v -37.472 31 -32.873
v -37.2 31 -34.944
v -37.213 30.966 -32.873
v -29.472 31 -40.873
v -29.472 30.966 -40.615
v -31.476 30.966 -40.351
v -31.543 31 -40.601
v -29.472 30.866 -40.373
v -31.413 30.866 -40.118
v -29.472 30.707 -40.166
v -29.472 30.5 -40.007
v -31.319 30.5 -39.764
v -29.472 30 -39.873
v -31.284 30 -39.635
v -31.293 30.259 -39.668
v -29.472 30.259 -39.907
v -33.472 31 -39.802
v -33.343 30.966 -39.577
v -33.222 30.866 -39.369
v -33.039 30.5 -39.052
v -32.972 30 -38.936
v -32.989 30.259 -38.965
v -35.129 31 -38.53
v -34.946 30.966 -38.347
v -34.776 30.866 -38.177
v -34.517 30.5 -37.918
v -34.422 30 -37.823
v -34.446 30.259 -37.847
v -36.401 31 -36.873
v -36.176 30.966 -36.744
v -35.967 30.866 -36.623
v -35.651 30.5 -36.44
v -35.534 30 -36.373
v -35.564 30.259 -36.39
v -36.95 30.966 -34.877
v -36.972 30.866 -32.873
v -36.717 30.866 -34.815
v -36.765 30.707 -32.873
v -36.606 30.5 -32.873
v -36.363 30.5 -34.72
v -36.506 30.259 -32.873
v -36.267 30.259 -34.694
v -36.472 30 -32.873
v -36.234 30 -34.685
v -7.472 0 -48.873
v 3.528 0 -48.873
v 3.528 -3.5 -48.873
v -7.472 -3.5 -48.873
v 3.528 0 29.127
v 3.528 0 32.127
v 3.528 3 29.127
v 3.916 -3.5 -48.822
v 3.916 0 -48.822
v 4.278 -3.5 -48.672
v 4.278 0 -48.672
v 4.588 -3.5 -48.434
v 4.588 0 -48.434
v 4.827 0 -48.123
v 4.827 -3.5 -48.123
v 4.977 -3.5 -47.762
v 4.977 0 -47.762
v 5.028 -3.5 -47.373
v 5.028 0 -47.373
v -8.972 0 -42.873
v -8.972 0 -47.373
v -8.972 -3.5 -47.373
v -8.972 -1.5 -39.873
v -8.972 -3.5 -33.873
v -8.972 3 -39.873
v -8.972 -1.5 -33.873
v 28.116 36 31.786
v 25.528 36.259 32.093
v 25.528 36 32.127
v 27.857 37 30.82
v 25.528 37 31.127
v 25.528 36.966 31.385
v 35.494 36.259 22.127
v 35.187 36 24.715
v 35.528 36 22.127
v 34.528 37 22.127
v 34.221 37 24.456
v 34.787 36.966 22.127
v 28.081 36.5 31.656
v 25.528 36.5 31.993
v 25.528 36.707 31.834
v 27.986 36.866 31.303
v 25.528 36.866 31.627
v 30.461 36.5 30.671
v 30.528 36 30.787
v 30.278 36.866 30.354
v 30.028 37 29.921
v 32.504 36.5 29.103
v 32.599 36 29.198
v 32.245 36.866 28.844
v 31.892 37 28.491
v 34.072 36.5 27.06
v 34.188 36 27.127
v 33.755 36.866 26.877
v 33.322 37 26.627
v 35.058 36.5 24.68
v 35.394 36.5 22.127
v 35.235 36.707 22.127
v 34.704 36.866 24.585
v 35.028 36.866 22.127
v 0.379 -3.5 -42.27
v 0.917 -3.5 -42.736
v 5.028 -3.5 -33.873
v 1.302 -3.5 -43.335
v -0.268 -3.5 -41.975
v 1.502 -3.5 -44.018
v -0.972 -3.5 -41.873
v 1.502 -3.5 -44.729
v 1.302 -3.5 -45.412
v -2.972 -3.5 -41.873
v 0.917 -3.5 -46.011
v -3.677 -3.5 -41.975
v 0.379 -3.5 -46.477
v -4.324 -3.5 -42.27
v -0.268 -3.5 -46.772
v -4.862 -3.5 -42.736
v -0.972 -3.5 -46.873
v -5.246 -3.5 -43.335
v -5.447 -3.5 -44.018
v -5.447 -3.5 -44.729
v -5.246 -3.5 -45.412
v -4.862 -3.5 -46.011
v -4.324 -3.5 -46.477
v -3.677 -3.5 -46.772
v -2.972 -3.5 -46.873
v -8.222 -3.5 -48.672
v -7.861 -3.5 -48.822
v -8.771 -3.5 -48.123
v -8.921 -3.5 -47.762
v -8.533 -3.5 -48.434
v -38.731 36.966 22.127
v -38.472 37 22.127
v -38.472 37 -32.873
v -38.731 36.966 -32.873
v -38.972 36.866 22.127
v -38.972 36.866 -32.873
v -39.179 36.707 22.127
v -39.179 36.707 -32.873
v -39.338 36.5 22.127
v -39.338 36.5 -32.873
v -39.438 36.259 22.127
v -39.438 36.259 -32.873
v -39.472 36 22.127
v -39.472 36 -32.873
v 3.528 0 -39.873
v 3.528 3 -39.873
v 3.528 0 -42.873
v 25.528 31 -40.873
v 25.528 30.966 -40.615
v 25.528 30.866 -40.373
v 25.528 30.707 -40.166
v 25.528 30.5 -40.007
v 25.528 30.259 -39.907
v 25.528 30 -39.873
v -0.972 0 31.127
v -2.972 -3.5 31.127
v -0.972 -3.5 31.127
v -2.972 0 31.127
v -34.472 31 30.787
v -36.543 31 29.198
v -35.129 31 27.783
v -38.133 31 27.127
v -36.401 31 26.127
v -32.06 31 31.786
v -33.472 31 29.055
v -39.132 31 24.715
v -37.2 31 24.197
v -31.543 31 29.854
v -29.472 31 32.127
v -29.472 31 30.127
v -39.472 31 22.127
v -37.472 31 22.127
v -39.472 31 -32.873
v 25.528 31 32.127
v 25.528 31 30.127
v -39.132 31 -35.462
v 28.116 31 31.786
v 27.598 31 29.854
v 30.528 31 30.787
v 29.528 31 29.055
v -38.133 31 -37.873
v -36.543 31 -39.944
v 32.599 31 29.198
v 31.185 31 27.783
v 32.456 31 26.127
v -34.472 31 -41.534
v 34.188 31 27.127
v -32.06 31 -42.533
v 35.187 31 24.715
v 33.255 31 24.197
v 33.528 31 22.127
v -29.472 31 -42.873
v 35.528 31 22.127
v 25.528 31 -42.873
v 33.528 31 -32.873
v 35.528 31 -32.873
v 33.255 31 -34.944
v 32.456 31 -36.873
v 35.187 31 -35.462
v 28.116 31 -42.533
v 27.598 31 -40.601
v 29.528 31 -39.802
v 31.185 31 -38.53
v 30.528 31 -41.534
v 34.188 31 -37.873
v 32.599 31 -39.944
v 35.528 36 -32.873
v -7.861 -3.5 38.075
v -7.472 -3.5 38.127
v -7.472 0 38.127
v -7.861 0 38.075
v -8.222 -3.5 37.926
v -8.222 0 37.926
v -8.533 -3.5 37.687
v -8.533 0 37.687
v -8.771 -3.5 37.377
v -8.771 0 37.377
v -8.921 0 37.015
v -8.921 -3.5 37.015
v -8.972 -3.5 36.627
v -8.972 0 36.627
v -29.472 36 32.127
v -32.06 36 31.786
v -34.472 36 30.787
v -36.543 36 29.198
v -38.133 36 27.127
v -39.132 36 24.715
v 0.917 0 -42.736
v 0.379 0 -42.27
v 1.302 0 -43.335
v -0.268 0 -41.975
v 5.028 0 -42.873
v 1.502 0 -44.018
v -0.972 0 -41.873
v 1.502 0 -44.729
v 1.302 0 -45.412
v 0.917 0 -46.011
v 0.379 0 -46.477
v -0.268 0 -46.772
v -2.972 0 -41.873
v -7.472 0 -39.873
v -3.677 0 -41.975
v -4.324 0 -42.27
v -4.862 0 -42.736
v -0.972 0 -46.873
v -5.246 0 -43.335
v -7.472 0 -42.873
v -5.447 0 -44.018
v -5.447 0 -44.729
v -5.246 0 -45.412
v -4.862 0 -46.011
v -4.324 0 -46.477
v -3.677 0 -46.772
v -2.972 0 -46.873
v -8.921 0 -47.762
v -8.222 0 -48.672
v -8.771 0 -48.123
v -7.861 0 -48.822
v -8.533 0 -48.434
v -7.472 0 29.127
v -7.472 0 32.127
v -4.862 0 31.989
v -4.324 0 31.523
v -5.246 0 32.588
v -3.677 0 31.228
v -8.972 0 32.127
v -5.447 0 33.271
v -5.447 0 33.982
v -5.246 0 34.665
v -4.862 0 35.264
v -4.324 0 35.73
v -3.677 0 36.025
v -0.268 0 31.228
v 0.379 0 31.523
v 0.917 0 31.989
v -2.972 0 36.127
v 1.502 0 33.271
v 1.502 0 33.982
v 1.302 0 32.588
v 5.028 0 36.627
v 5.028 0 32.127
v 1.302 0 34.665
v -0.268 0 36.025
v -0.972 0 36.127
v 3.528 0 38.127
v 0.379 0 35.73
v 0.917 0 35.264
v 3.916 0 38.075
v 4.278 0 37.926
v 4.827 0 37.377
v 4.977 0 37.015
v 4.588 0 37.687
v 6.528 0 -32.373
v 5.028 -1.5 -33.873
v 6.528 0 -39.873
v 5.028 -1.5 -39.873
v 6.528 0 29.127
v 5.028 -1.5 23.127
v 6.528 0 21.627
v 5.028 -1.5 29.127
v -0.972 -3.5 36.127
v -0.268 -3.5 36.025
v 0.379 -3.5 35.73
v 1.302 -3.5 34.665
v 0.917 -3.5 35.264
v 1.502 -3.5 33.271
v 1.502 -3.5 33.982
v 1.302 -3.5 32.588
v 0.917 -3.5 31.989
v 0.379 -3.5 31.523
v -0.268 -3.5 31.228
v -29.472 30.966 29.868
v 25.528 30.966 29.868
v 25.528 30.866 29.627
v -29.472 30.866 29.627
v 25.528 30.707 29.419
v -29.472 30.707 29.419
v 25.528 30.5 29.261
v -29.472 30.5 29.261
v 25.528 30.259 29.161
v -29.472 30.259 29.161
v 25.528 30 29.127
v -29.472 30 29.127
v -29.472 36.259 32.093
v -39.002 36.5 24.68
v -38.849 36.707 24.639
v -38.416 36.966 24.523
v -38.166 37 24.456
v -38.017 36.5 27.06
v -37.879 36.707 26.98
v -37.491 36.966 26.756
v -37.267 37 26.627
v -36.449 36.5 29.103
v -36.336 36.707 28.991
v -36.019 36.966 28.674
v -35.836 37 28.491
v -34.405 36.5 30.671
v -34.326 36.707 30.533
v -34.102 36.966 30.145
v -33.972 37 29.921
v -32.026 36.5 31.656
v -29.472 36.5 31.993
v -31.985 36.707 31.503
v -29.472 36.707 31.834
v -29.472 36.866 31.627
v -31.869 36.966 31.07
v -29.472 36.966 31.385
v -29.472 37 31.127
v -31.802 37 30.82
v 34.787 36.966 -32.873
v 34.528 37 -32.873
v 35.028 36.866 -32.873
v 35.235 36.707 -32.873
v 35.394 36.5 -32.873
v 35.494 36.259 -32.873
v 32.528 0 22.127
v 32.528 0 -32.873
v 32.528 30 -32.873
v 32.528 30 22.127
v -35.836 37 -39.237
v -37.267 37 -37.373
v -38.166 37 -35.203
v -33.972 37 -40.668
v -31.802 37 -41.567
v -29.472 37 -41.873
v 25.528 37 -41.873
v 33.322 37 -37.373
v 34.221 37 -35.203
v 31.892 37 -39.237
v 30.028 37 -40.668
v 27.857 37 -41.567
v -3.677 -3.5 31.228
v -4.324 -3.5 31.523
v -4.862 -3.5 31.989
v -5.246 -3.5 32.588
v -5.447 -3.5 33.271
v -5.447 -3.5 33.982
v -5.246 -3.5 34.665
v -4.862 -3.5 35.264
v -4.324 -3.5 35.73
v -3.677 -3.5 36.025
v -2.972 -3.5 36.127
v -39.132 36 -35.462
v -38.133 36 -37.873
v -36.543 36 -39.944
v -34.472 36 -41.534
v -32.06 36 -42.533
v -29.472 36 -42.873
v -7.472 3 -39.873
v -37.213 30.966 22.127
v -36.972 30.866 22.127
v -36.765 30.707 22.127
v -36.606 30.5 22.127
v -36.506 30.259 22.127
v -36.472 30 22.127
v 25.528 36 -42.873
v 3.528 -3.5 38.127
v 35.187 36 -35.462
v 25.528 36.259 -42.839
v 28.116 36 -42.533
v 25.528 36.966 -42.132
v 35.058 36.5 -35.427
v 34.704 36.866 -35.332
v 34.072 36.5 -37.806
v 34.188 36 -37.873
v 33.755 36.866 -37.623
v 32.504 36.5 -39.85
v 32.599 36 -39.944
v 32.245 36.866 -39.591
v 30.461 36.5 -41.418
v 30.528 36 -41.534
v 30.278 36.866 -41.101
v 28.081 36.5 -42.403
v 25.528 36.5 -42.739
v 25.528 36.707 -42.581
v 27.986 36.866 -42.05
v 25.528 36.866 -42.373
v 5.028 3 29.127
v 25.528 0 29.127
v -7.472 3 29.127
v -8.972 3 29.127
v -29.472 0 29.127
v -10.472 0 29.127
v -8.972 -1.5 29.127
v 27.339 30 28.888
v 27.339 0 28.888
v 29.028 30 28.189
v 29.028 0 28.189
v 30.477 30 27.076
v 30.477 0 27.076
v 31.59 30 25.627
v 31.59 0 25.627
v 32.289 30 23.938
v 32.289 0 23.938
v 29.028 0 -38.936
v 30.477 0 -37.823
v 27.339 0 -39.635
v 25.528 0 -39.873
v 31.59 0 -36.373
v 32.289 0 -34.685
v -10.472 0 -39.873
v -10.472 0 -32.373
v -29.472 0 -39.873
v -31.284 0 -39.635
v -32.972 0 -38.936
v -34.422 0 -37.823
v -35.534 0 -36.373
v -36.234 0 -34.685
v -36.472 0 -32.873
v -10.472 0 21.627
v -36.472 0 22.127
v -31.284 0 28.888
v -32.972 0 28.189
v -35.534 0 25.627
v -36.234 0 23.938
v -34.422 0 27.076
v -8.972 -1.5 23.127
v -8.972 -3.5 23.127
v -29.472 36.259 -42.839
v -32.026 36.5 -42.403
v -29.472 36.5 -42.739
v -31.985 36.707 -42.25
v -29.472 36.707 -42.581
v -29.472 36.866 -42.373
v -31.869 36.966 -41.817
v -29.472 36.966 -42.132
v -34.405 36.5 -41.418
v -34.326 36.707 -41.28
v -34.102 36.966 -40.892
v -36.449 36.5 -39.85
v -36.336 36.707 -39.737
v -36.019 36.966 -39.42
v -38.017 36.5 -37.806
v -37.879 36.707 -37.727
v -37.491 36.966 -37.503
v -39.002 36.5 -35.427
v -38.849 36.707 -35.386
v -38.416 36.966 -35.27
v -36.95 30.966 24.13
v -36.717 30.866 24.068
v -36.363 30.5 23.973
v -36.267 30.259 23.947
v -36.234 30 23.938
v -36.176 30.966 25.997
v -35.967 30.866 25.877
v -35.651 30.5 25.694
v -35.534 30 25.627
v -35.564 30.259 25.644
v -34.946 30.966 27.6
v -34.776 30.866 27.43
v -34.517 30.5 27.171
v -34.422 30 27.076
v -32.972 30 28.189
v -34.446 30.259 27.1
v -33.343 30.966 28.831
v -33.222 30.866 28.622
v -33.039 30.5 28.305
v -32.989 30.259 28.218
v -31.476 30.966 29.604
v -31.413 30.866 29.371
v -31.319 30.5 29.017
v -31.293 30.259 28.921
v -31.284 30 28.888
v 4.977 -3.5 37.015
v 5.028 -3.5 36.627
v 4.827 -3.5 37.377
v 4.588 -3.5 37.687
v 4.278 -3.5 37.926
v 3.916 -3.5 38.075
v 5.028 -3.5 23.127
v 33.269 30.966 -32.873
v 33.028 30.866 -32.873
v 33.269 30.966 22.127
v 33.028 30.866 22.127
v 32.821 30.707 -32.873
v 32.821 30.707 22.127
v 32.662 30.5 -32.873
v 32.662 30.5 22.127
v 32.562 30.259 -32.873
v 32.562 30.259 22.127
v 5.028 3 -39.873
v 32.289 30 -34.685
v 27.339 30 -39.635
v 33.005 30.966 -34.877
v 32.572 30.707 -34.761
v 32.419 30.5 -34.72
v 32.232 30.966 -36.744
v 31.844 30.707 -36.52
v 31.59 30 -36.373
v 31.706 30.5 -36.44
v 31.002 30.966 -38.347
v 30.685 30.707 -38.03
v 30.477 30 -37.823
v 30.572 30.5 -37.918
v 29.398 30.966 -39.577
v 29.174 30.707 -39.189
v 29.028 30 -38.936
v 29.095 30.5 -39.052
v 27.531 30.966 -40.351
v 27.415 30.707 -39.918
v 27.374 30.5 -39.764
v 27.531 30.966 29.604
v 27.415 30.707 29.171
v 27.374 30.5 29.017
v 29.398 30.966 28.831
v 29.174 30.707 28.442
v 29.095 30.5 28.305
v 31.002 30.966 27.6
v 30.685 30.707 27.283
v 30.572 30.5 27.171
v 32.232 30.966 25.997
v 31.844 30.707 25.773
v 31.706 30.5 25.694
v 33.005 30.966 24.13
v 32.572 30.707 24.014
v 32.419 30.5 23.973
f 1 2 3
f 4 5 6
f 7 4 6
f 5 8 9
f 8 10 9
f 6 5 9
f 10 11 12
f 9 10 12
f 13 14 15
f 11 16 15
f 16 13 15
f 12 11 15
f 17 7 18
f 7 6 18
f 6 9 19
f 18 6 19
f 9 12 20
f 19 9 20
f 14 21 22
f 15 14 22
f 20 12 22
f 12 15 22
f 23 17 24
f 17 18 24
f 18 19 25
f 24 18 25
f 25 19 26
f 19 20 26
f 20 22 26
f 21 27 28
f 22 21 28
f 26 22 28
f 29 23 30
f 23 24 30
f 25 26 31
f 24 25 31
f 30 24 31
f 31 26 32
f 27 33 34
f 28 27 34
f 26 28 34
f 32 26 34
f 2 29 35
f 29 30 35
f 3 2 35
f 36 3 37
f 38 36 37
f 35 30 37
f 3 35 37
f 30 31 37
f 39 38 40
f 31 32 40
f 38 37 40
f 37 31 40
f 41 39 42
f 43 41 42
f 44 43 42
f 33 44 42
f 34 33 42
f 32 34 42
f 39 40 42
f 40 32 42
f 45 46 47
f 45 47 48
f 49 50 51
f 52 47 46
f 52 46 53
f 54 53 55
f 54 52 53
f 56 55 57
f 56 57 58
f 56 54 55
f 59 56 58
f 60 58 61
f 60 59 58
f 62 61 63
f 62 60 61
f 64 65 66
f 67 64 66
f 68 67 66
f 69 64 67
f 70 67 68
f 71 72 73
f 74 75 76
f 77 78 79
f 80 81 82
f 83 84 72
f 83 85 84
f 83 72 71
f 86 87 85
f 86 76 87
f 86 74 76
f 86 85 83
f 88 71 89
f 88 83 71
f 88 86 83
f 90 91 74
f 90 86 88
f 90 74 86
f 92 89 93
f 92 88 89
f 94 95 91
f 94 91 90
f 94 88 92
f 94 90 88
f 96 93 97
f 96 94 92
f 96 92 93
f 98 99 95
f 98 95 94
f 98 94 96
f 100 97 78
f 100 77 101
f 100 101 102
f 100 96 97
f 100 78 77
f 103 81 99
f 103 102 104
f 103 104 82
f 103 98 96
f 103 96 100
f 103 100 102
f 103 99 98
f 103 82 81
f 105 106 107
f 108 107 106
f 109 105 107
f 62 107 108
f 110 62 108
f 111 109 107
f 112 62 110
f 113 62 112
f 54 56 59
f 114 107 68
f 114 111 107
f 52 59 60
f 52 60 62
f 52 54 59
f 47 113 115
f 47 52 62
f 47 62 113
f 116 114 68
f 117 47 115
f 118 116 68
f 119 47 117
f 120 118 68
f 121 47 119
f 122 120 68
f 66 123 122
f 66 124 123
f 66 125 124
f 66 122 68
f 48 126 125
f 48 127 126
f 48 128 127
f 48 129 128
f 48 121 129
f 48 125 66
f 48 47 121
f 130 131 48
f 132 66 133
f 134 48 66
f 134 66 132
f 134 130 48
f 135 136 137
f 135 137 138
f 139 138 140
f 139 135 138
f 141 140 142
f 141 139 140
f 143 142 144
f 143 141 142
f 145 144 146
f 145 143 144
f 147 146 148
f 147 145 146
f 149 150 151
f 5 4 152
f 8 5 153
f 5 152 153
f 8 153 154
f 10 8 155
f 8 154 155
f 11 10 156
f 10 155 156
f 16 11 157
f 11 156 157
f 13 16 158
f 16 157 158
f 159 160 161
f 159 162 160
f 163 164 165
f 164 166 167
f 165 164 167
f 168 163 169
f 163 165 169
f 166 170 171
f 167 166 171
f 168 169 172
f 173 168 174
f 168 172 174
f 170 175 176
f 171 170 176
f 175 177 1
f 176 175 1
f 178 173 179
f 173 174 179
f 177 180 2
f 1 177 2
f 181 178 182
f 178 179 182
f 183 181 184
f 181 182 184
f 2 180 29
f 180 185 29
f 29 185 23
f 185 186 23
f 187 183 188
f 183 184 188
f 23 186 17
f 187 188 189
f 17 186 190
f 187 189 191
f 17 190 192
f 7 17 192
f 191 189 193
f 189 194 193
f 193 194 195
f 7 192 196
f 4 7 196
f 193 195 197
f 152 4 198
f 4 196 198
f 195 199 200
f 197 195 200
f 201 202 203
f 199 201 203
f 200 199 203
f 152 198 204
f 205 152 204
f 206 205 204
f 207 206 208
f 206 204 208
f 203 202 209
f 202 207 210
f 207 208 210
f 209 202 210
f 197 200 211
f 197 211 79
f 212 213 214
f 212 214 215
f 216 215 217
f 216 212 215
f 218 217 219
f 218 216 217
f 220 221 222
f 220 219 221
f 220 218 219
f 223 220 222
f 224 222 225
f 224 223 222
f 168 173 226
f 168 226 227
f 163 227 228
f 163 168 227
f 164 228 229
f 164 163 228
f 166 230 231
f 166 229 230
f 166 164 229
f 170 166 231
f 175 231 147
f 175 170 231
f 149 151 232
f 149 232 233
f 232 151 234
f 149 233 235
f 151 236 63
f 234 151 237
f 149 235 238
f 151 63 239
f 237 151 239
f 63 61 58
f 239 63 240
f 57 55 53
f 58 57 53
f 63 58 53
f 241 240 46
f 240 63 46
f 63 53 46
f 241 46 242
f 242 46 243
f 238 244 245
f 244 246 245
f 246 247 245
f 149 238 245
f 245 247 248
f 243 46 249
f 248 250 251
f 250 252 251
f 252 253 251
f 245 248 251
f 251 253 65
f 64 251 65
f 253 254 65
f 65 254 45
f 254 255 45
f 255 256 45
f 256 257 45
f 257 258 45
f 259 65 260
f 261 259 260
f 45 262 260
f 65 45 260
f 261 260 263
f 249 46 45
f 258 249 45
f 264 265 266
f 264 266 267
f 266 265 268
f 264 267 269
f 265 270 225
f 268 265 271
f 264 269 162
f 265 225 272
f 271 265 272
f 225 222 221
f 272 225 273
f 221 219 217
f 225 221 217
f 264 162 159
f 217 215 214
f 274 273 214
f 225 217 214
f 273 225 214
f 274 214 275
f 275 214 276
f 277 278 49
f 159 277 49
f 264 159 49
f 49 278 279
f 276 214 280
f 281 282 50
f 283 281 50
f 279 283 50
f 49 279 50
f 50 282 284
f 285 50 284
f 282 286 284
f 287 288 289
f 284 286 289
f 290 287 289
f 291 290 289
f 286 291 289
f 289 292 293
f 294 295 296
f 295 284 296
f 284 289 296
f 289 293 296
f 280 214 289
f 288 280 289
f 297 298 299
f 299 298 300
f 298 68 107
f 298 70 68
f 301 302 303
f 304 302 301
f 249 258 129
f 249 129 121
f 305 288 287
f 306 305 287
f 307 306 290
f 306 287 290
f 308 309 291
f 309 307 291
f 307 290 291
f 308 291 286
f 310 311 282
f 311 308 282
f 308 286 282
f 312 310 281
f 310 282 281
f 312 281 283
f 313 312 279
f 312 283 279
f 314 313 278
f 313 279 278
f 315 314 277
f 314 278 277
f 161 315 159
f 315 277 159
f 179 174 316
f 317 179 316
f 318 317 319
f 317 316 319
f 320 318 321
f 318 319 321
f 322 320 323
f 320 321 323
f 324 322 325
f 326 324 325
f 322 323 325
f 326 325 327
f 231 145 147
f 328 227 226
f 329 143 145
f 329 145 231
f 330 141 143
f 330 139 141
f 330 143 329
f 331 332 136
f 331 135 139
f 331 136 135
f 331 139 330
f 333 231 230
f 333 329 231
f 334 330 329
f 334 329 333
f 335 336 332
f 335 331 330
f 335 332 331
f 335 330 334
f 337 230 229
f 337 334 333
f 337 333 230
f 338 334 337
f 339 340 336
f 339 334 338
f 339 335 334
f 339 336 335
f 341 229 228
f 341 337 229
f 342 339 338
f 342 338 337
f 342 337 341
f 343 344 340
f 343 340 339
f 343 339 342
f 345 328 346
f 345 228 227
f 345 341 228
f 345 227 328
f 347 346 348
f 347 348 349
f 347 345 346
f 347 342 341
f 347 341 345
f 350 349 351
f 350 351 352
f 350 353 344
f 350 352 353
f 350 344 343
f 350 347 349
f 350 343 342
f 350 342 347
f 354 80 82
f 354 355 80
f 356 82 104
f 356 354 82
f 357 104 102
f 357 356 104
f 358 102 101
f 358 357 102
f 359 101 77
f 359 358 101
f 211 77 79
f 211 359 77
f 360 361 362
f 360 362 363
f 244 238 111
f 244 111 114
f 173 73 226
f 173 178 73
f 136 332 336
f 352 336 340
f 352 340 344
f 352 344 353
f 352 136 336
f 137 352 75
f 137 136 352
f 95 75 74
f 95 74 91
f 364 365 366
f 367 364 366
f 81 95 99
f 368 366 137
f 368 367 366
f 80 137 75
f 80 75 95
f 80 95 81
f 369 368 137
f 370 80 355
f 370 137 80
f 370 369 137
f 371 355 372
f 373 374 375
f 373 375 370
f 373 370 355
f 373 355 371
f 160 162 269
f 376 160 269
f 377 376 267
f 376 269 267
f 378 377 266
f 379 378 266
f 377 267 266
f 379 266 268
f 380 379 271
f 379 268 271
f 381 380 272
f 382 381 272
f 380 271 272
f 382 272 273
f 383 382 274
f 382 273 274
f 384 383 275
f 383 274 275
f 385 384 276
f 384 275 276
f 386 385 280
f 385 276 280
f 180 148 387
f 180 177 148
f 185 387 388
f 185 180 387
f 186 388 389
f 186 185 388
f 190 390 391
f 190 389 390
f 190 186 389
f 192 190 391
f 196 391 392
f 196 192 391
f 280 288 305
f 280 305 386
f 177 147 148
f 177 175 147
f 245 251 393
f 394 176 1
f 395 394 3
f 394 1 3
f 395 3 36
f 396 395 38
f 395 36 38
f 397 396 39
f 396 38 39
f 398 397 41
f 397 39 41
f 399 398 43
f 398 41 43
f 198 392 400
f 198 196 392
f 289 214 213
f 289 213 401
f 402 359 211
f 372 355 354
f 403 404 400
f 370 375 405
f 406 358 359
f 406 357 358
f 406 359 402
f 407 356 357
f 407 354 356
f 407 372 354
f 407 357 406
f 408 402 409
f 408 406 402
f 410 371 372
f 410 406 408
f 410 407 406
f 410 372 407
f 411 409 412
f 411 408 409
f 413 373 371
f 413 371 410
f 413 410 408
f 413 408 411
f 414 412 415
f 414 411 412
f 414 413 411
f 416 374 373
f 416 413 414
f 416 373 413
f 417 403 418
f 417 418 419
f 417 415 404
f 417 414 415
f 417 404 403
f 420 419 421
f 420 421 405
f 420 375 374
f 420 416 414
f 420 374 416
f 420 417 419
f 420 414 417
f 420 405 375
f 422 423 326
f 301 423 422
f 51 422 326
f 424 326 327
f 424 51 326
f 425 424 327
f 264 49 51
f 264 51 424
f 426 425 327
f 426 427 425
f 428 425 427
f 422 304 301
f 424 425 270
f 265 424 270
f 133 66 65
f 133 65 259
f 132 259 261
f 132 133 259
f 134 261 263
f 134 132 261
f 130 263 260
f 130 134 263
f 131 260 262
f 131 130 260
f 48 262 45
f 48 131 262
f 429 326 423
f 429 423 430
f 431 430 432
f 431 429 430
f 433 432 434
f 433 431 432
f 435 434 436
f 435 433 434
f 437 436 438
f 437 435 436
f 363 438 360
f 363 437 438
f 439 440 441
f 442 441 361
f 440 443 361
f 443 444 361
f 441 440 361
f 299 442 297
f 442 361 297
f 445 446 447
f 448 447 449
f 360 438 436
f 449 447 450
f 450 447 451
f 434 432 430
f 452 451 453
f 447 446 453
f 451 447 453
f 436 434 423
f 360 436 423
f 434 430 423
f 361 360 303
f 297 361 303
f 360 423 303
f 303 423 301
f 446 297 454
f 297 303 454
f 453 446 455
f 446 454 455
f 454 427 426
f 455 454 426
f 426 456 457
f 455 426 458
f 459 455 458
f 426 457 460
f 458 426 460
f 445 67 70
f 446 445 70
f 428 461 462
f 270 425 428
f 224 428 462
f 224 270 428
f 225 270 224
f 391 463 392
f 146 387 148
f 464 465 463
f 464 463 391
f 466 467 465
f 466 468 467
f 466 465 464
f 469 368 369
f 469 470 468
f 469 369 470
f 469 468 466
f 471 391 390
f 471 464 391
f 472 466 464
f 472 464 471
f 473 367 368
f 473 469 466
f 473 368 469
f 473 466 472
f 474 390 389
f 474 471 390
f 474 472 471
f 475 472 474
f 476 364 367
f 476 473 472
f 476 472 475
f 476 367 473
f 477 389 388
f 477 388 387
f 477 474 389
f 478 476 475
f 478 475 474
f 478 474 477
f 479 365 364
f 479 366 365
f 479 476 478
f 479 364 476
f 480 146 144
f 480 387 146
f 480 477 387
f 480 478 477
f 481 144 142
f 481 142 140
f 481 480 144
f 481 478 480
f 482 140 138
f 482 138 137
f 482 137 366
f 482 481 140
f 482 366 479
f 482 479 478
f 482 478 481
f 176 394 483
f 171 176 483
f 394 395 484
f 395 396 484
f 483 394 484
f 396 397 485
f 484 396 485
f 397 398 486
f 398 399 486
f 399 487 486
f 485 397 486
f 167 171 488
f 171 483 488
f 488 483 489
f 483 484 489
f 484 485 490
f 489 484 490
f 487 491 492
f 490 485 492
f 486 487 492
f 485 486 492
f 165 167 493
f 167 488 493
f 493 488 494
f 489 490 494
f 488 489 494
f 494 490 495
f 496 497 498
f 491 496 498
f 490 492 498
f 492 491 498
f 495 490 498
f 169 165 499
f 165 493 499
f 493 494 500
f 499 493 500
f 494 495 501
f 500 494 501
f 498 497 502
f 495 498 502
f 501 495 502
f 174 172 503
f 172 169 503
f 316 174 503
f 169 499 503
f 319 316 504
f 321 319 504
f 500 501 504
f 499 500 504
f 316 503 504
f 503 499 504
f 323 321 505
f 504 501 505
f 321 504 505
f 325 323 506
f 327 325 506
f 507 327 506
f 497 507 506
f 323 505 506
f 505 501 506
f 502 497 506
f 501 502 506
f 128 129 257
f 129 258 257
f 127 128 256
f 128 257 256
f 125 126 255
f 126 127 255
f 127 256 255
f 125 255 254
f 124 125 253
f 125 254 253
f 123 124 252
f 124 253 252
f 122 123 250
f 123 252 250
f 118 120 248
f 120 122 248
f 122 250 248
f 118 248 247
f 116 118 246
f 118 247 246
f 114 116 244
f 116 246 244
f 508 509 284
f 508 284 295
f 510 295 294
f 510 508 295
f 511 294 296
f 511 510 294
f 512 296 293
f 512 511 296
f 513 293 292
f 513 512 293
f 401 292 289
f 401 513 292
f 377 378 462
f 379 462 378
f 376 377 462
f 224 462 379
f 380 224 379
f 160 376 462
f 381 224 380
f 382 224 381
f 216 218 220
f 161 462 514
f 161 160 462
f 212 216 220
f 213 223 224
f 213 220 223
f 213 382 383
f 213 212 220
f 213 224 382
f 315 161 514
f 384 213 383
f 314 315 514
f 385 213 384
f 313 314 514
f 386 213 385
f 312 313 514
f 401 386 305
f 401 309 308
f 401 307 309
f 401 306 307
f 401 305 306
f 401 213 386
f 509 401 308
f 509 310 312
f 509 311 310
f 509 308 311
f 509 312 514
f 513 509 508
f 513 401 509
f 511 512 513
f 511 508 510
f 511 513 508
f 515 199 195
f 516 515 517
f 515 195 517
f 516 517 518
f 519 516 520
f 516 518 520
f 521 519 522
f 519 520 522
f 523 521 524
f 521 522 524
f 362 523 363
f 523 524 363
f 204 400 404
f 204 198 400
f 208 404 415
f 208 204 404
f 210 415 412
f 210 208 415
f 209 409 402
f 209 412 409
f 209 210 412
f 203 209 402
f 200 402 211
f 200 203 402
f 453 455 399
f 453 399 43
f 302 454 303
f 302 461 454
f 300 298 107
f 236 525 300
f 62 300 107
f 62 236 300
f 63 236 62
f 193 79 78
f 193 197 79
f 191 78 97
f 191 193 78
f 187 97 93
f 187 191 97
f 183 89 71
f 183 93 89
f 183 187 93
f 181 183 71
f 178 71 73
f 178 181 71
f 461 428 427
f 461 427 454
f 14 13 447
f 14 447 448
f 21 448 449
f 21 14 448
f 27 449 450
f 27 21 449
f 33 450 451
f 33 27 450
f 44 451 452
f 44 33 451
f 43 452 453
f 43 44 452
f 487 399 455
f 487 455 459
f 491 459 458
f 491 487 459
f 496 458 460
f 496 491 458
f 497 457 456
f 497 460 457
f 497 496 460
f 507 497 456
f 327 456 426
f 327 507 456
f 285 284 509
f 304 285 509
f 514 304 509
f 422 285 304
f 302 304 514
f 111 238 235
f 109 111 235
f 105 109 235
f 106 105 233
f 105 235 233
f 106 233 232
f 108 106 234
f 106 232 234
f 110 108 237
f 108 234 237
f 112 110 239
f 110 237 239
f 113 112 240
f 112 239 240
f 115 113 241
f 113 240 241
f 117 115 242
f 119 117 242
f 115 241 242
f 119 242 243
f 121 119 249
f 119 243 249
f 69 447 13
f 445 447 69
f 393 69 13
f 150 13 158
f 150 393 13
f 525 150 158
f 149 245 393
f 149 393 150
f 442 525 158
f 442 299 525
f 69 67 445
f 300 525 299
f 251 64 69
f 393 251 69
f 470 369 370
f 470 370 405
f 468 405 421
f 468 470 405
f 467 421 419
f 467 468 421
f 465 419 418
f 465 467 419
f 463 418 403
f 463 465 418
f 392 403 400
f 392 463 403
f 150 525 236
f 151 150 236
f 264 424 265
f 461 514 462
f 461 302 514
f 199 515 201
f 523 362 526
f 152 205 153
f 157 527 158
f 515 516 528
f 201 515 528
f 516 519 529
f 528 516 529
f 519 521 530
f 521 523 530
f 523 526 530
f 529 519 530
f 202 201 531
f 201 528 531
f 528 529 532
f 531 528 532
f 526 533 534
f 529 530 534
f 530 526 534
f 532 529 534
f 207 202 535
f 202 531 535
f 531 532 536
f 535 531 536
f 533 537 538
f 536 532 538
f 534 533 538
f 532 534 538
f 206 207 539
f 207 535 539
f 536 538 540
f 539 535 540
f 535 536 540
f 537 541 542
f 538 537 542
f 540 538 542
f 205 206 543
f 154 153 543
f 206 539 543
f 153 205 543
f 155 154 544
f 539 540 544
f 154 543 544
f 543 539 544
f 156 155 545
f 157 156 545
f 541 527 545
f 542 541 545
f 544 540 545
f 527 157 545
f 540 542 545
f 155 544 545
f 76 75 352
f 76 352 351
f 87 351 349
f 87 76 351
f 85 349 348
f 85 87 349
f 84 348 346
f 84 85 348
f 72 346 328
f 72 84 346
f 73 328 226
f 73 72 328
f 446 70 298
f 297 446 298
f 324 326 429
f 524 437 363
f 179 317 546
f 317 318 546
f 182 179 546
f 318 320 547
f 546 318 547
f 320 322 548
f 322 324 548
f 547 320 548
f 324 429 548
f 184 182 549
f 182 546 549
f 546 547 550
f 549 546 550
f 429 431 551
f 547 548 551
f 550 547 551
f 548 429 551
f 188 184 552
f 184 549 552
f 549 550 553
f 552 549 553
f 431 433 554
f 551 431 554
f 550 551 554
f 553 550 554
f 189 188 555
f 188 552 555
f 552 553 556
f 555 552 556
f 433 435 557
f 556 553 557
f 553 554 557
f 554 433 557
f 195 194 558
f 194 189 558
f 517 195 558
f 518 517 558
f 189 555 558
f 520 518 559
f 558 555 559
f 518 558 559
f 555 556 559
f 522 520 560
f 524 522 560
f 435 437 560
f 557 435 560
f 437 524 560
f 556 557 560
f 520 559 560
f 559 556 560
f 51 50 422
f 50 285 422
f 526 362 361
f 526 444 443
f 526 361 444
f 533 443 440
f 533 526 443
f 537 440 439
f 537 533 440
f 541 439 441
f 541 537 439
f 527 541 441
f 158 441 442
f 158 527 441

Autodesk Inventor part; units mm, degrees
ref_plane "YZ Plane" through (0, 0, 0) normal (1, 0, 0) x (0, 1, 0)
sketch "Sketch1" plane through (0, 0, 0) normal (0, 1, 0) x (-1, 0, 0)
  line L0 (36.4723, -39.8734) -> (-32.5277, -39.8734)
  line L1 (-32.5277, -39.8734) -> (-32.5277, 29.1266)
  line L2 (-32.5277, 29.1266) -> (36.4723, 29.1266)
  line L3 (36.4723, 29.1266) -> (36.4723, -39.8734)
  line L4 (36.4723, -39.8734) -> (-32.5277, 29.1266) construction
  line L5 (-32.5277, -39.8734) -> (36.4723, 29.1266) construction
  point P0 (0, 0)
  point P1 (1.9723, -5.3734)
  dimension "d0" = 69
  dimension "d1" = 69
extrude "Extrusion1" add sketch "Sketch1" along normal blind 31
fillet "Fillet1" radius 7 4 edges at (32.5277, 15.5, 29.1266) (-36.4723, 15.5, 29.1266) (-36.4723, 15.5, -39.8734) (32.5277, 15.5, -39.8734)
sketch "Sketch2" plane through (0, 31, 0) normal (0, 1, 0) x (1, 0, 0)
  arc A0 (32.5277, 32.8734) -> (25.5277, 39.8734) centre (25.5277, 32.8734) ccw projected
  line L0 (25.5277, 39.8734) -> (-29.4723, 39.8734) projected
  arc A1 (-29.4723, 39.8734) -> (-36.4723, 32.8734) centre (-29.4723, 32.8734) ccw projected
  line L1 (-36.4723, 32.8734) -> (-36.4723, -22.1266) projected
  arc A2 (-36.4723, -22.1266) -> (-29.4723, -29.1266) centre (-29.4723, -22.1266) ccw projected
  line L2 (-29.4723, -29.1266) -> (25.5277, -29.1266) projected
  arc A3 (25.5277, -29.1266) -> (32.5277, -22.1266) centre (25.5277, -22.1266) ccw projected
  line L3 (32.5277, -22.1266) -> (32.5277, 32.8734) projected
  line L4 (-29.4723, 42.8734) -> (25.5277, 42.8734)
  arc A4 (35.5277, 32.8734) -> (25.5277, 42.8734) centre (25.5277, 32.8734) ccw
  line L5 (35.5277, 32.8734) -> (35.5277, -22.1266)
  arc A5 (25.5277, -32.1266) -> (35.5277, -22.1266) centre (25.5277, -22.1266) ccw
  line L6 (25.5277, -32.1266) -> (-29.4723, -32.1266)
  arc A6 (-39.4723, -22.1266) -> (-29.4723, -32.1266) centre (-29.4723, -22.1266) ccw
  line L7 (-39.4723, -22.1266) -> (-39.4723, 32.8734)
  arc A7 (-29.4723, 42.8734) -> (-39.4723, 32.8734) centre (-29.4723, 32.8734) ccw
  point P0 (0, 0)
  dimension "d5" = 3
extrude "Extrusion2" add sketch "Sketch2" along normal blind 6 contours L3 A3 L2 A2 L1 A1 L0 A0 | L4 A4 L5 A5 L6 A6 L7 A7
fillet "Fillet2" radius 1 8 edges at (-1.9723, 31, 29.1266) (-34.422, 31, 27.0763) (-36.4723, 31, -5.3734) (-34.422, 31, -37.8232) (-1.9723, 31, -39.8734) (30.4775, 31, -37.8232) (32.5277, 31, -5.3734) (30.4775, 31, 27.0763)
fillet "Fillet3" radius 1 8 edges at (32.5988, 37, 29.1977) (35.5277, 37, -5.3734) (32.5988, 37, -39.9445) (-1.9723, 37, -42.8734) (-36.5433, 37, -39.9445) (-39.4723, 37, -5.3734) (-36.5433, 37, 29.1977) (-1.9723, 37, 32.1266)
sketch "Sketch3" plane through (0, 0, 0) normal (0, -1, 0) x (1, 0, 0)
  line L0 (32.5277, -32.8734) -> (32.5277, 22.1266) projected
  line L1 (25.5277, 29.1266) -> (-29.4723, 29.1266) projected
  line L2 (-36.4723, 22.1266) -> (-36.4723, -32.8734) projected
  line L3 (-8.9723, 38.1266) -> (5.0277, 38.1266)
  line L4 (5.0277, 38.1266) -> (5.0277, 23.1266)
  line L5 (5.0277, 23.1266) -> (-8.9723, 23.1266)
  line L6 (-8.9723, 23.1266) -> (-8.9723, 38.1266)
  line L7 (-8.9723, 23.1266) -> (-36.4723, 23.1266)
  line L8 (5.0277, 23.1266) -> (32.5277, 23.1266)
  point P0 (0, 0)
  dimension "d10" = 14
  dimension "d12" = 15
  dimension "d13" = 9
extrude "Extrusion3" add sketch "Sketch3" along normal blind 3.5
chamfer "Chamfer1" distance 1.5 angle 45 3 edges at (-8.9723, 0, 26.1266) (-1.9723, 0, 23.1266) (5.0277, 0, 26.1266)
sketch "Sketch4" plane through (0, 0, 0) normal (0, 1, 0) x (1, 0, 0)
  line L0 (5.0277, -29.1266) -> (-8.9723, -29.1266) projected
  line L1 (-8.9723, -38.1266) -> (5.0277, -38.1266) projected
  line L2 (-1.9723, -38.1266) -> (-1.9723, -29.1266)
  line L3 (-1.9723, -33.6266) -> (-0.9723, -33.6266)
  line L4 (-1.9723, -33.6266) -> (-2.9723, -33.6266)
  circle A0 centre (-2.9723, -33.6266) radius 2.5
  circle A1 centre (-0.9723, -33.6266) radius 2.5
  line L5 (-2.9723, -31.1266) -> (-0.9723, -31.1266)
  line L6 (-0.9723, -31.1266) -> (-0.9723, -36.1266)
  line L7 (-0.9723, -36.1266) -> (-2.9723, -36.1266)
  line L8 (-2.9723, -36.1266) -> (-2.9723, -31.1266)
  point P0 (0, 0)
  dimension "d21" = 5
  dimension "d22" = 5
  dimension "d19" = 1
  dimension "d20" = 1
extrude "Extrusion4" cut sketch "Sketch4" against normal blind 3.5
sketch "Sketch5" plane through (5.0277, 0, 38.1266) normal (1, 0, 0) x (0, 0, -1)
  line L0 (0, 0) -> (9, 0) projected
  line L1 (9, 0) -> (9, 30) projected
  line L2 (9, -1.5) -> (9, 0) projected
  line L3 (9, 0) -> (9, -1.5) projected
  line L4 (9, -1.5) -> (9, 0) projected
  line L5 (9, -1.5) -> (9, 0) projected
  line L6 (9, 30) -> (9, 0) projected
  line L7 (6, 0) -> (9, 3)
  line L8 (6, 0) -> (10.2426, 0) construction
  line L9 (6, 0) -> (9, 0)
  line L10 (9, 3) -> (9, 0)
  point P0 (38.1266, 0)
  dimension "d25" = 45
  dimension "d26" = 3
extrude "Extrusion5" add sketch "Sketch5" against normal blind 1.5
ref_plane "Work Plane1" through (-1.9723, -3.5, 38.1266) normal (1, 0, 0) x (0, 0, -1)
mirror "Mirror1" about plane through (-1.9723, -3.5, 38.1266) normal (1, 0, 0) of "Extrusion5"
fillet "Fillet4" radius 1.5 2 edges at (-8.9723, -1.75, 38.1266) (5.0277, -1.75, 38.1266)
ref_plane "Work Plane2" through (-29.4723, 30, -5.3734) normal (0, 0, 1) x (1, 0, 0)
mirror "Mirror2" about plane through (-29.4723, 30, -5.3734) normal (0, 0, 1) of "Extrusion3", "Chamfer1", "Extrusion4", "Extrusion5", "Mirror1", "Fillet4"
ref_plane "Work Plane3" through (-1.9723, -3.5, -48.8734) normal (-1, 0, 0) x (0, 0, 1)
properties part number "power_conduit_box"
